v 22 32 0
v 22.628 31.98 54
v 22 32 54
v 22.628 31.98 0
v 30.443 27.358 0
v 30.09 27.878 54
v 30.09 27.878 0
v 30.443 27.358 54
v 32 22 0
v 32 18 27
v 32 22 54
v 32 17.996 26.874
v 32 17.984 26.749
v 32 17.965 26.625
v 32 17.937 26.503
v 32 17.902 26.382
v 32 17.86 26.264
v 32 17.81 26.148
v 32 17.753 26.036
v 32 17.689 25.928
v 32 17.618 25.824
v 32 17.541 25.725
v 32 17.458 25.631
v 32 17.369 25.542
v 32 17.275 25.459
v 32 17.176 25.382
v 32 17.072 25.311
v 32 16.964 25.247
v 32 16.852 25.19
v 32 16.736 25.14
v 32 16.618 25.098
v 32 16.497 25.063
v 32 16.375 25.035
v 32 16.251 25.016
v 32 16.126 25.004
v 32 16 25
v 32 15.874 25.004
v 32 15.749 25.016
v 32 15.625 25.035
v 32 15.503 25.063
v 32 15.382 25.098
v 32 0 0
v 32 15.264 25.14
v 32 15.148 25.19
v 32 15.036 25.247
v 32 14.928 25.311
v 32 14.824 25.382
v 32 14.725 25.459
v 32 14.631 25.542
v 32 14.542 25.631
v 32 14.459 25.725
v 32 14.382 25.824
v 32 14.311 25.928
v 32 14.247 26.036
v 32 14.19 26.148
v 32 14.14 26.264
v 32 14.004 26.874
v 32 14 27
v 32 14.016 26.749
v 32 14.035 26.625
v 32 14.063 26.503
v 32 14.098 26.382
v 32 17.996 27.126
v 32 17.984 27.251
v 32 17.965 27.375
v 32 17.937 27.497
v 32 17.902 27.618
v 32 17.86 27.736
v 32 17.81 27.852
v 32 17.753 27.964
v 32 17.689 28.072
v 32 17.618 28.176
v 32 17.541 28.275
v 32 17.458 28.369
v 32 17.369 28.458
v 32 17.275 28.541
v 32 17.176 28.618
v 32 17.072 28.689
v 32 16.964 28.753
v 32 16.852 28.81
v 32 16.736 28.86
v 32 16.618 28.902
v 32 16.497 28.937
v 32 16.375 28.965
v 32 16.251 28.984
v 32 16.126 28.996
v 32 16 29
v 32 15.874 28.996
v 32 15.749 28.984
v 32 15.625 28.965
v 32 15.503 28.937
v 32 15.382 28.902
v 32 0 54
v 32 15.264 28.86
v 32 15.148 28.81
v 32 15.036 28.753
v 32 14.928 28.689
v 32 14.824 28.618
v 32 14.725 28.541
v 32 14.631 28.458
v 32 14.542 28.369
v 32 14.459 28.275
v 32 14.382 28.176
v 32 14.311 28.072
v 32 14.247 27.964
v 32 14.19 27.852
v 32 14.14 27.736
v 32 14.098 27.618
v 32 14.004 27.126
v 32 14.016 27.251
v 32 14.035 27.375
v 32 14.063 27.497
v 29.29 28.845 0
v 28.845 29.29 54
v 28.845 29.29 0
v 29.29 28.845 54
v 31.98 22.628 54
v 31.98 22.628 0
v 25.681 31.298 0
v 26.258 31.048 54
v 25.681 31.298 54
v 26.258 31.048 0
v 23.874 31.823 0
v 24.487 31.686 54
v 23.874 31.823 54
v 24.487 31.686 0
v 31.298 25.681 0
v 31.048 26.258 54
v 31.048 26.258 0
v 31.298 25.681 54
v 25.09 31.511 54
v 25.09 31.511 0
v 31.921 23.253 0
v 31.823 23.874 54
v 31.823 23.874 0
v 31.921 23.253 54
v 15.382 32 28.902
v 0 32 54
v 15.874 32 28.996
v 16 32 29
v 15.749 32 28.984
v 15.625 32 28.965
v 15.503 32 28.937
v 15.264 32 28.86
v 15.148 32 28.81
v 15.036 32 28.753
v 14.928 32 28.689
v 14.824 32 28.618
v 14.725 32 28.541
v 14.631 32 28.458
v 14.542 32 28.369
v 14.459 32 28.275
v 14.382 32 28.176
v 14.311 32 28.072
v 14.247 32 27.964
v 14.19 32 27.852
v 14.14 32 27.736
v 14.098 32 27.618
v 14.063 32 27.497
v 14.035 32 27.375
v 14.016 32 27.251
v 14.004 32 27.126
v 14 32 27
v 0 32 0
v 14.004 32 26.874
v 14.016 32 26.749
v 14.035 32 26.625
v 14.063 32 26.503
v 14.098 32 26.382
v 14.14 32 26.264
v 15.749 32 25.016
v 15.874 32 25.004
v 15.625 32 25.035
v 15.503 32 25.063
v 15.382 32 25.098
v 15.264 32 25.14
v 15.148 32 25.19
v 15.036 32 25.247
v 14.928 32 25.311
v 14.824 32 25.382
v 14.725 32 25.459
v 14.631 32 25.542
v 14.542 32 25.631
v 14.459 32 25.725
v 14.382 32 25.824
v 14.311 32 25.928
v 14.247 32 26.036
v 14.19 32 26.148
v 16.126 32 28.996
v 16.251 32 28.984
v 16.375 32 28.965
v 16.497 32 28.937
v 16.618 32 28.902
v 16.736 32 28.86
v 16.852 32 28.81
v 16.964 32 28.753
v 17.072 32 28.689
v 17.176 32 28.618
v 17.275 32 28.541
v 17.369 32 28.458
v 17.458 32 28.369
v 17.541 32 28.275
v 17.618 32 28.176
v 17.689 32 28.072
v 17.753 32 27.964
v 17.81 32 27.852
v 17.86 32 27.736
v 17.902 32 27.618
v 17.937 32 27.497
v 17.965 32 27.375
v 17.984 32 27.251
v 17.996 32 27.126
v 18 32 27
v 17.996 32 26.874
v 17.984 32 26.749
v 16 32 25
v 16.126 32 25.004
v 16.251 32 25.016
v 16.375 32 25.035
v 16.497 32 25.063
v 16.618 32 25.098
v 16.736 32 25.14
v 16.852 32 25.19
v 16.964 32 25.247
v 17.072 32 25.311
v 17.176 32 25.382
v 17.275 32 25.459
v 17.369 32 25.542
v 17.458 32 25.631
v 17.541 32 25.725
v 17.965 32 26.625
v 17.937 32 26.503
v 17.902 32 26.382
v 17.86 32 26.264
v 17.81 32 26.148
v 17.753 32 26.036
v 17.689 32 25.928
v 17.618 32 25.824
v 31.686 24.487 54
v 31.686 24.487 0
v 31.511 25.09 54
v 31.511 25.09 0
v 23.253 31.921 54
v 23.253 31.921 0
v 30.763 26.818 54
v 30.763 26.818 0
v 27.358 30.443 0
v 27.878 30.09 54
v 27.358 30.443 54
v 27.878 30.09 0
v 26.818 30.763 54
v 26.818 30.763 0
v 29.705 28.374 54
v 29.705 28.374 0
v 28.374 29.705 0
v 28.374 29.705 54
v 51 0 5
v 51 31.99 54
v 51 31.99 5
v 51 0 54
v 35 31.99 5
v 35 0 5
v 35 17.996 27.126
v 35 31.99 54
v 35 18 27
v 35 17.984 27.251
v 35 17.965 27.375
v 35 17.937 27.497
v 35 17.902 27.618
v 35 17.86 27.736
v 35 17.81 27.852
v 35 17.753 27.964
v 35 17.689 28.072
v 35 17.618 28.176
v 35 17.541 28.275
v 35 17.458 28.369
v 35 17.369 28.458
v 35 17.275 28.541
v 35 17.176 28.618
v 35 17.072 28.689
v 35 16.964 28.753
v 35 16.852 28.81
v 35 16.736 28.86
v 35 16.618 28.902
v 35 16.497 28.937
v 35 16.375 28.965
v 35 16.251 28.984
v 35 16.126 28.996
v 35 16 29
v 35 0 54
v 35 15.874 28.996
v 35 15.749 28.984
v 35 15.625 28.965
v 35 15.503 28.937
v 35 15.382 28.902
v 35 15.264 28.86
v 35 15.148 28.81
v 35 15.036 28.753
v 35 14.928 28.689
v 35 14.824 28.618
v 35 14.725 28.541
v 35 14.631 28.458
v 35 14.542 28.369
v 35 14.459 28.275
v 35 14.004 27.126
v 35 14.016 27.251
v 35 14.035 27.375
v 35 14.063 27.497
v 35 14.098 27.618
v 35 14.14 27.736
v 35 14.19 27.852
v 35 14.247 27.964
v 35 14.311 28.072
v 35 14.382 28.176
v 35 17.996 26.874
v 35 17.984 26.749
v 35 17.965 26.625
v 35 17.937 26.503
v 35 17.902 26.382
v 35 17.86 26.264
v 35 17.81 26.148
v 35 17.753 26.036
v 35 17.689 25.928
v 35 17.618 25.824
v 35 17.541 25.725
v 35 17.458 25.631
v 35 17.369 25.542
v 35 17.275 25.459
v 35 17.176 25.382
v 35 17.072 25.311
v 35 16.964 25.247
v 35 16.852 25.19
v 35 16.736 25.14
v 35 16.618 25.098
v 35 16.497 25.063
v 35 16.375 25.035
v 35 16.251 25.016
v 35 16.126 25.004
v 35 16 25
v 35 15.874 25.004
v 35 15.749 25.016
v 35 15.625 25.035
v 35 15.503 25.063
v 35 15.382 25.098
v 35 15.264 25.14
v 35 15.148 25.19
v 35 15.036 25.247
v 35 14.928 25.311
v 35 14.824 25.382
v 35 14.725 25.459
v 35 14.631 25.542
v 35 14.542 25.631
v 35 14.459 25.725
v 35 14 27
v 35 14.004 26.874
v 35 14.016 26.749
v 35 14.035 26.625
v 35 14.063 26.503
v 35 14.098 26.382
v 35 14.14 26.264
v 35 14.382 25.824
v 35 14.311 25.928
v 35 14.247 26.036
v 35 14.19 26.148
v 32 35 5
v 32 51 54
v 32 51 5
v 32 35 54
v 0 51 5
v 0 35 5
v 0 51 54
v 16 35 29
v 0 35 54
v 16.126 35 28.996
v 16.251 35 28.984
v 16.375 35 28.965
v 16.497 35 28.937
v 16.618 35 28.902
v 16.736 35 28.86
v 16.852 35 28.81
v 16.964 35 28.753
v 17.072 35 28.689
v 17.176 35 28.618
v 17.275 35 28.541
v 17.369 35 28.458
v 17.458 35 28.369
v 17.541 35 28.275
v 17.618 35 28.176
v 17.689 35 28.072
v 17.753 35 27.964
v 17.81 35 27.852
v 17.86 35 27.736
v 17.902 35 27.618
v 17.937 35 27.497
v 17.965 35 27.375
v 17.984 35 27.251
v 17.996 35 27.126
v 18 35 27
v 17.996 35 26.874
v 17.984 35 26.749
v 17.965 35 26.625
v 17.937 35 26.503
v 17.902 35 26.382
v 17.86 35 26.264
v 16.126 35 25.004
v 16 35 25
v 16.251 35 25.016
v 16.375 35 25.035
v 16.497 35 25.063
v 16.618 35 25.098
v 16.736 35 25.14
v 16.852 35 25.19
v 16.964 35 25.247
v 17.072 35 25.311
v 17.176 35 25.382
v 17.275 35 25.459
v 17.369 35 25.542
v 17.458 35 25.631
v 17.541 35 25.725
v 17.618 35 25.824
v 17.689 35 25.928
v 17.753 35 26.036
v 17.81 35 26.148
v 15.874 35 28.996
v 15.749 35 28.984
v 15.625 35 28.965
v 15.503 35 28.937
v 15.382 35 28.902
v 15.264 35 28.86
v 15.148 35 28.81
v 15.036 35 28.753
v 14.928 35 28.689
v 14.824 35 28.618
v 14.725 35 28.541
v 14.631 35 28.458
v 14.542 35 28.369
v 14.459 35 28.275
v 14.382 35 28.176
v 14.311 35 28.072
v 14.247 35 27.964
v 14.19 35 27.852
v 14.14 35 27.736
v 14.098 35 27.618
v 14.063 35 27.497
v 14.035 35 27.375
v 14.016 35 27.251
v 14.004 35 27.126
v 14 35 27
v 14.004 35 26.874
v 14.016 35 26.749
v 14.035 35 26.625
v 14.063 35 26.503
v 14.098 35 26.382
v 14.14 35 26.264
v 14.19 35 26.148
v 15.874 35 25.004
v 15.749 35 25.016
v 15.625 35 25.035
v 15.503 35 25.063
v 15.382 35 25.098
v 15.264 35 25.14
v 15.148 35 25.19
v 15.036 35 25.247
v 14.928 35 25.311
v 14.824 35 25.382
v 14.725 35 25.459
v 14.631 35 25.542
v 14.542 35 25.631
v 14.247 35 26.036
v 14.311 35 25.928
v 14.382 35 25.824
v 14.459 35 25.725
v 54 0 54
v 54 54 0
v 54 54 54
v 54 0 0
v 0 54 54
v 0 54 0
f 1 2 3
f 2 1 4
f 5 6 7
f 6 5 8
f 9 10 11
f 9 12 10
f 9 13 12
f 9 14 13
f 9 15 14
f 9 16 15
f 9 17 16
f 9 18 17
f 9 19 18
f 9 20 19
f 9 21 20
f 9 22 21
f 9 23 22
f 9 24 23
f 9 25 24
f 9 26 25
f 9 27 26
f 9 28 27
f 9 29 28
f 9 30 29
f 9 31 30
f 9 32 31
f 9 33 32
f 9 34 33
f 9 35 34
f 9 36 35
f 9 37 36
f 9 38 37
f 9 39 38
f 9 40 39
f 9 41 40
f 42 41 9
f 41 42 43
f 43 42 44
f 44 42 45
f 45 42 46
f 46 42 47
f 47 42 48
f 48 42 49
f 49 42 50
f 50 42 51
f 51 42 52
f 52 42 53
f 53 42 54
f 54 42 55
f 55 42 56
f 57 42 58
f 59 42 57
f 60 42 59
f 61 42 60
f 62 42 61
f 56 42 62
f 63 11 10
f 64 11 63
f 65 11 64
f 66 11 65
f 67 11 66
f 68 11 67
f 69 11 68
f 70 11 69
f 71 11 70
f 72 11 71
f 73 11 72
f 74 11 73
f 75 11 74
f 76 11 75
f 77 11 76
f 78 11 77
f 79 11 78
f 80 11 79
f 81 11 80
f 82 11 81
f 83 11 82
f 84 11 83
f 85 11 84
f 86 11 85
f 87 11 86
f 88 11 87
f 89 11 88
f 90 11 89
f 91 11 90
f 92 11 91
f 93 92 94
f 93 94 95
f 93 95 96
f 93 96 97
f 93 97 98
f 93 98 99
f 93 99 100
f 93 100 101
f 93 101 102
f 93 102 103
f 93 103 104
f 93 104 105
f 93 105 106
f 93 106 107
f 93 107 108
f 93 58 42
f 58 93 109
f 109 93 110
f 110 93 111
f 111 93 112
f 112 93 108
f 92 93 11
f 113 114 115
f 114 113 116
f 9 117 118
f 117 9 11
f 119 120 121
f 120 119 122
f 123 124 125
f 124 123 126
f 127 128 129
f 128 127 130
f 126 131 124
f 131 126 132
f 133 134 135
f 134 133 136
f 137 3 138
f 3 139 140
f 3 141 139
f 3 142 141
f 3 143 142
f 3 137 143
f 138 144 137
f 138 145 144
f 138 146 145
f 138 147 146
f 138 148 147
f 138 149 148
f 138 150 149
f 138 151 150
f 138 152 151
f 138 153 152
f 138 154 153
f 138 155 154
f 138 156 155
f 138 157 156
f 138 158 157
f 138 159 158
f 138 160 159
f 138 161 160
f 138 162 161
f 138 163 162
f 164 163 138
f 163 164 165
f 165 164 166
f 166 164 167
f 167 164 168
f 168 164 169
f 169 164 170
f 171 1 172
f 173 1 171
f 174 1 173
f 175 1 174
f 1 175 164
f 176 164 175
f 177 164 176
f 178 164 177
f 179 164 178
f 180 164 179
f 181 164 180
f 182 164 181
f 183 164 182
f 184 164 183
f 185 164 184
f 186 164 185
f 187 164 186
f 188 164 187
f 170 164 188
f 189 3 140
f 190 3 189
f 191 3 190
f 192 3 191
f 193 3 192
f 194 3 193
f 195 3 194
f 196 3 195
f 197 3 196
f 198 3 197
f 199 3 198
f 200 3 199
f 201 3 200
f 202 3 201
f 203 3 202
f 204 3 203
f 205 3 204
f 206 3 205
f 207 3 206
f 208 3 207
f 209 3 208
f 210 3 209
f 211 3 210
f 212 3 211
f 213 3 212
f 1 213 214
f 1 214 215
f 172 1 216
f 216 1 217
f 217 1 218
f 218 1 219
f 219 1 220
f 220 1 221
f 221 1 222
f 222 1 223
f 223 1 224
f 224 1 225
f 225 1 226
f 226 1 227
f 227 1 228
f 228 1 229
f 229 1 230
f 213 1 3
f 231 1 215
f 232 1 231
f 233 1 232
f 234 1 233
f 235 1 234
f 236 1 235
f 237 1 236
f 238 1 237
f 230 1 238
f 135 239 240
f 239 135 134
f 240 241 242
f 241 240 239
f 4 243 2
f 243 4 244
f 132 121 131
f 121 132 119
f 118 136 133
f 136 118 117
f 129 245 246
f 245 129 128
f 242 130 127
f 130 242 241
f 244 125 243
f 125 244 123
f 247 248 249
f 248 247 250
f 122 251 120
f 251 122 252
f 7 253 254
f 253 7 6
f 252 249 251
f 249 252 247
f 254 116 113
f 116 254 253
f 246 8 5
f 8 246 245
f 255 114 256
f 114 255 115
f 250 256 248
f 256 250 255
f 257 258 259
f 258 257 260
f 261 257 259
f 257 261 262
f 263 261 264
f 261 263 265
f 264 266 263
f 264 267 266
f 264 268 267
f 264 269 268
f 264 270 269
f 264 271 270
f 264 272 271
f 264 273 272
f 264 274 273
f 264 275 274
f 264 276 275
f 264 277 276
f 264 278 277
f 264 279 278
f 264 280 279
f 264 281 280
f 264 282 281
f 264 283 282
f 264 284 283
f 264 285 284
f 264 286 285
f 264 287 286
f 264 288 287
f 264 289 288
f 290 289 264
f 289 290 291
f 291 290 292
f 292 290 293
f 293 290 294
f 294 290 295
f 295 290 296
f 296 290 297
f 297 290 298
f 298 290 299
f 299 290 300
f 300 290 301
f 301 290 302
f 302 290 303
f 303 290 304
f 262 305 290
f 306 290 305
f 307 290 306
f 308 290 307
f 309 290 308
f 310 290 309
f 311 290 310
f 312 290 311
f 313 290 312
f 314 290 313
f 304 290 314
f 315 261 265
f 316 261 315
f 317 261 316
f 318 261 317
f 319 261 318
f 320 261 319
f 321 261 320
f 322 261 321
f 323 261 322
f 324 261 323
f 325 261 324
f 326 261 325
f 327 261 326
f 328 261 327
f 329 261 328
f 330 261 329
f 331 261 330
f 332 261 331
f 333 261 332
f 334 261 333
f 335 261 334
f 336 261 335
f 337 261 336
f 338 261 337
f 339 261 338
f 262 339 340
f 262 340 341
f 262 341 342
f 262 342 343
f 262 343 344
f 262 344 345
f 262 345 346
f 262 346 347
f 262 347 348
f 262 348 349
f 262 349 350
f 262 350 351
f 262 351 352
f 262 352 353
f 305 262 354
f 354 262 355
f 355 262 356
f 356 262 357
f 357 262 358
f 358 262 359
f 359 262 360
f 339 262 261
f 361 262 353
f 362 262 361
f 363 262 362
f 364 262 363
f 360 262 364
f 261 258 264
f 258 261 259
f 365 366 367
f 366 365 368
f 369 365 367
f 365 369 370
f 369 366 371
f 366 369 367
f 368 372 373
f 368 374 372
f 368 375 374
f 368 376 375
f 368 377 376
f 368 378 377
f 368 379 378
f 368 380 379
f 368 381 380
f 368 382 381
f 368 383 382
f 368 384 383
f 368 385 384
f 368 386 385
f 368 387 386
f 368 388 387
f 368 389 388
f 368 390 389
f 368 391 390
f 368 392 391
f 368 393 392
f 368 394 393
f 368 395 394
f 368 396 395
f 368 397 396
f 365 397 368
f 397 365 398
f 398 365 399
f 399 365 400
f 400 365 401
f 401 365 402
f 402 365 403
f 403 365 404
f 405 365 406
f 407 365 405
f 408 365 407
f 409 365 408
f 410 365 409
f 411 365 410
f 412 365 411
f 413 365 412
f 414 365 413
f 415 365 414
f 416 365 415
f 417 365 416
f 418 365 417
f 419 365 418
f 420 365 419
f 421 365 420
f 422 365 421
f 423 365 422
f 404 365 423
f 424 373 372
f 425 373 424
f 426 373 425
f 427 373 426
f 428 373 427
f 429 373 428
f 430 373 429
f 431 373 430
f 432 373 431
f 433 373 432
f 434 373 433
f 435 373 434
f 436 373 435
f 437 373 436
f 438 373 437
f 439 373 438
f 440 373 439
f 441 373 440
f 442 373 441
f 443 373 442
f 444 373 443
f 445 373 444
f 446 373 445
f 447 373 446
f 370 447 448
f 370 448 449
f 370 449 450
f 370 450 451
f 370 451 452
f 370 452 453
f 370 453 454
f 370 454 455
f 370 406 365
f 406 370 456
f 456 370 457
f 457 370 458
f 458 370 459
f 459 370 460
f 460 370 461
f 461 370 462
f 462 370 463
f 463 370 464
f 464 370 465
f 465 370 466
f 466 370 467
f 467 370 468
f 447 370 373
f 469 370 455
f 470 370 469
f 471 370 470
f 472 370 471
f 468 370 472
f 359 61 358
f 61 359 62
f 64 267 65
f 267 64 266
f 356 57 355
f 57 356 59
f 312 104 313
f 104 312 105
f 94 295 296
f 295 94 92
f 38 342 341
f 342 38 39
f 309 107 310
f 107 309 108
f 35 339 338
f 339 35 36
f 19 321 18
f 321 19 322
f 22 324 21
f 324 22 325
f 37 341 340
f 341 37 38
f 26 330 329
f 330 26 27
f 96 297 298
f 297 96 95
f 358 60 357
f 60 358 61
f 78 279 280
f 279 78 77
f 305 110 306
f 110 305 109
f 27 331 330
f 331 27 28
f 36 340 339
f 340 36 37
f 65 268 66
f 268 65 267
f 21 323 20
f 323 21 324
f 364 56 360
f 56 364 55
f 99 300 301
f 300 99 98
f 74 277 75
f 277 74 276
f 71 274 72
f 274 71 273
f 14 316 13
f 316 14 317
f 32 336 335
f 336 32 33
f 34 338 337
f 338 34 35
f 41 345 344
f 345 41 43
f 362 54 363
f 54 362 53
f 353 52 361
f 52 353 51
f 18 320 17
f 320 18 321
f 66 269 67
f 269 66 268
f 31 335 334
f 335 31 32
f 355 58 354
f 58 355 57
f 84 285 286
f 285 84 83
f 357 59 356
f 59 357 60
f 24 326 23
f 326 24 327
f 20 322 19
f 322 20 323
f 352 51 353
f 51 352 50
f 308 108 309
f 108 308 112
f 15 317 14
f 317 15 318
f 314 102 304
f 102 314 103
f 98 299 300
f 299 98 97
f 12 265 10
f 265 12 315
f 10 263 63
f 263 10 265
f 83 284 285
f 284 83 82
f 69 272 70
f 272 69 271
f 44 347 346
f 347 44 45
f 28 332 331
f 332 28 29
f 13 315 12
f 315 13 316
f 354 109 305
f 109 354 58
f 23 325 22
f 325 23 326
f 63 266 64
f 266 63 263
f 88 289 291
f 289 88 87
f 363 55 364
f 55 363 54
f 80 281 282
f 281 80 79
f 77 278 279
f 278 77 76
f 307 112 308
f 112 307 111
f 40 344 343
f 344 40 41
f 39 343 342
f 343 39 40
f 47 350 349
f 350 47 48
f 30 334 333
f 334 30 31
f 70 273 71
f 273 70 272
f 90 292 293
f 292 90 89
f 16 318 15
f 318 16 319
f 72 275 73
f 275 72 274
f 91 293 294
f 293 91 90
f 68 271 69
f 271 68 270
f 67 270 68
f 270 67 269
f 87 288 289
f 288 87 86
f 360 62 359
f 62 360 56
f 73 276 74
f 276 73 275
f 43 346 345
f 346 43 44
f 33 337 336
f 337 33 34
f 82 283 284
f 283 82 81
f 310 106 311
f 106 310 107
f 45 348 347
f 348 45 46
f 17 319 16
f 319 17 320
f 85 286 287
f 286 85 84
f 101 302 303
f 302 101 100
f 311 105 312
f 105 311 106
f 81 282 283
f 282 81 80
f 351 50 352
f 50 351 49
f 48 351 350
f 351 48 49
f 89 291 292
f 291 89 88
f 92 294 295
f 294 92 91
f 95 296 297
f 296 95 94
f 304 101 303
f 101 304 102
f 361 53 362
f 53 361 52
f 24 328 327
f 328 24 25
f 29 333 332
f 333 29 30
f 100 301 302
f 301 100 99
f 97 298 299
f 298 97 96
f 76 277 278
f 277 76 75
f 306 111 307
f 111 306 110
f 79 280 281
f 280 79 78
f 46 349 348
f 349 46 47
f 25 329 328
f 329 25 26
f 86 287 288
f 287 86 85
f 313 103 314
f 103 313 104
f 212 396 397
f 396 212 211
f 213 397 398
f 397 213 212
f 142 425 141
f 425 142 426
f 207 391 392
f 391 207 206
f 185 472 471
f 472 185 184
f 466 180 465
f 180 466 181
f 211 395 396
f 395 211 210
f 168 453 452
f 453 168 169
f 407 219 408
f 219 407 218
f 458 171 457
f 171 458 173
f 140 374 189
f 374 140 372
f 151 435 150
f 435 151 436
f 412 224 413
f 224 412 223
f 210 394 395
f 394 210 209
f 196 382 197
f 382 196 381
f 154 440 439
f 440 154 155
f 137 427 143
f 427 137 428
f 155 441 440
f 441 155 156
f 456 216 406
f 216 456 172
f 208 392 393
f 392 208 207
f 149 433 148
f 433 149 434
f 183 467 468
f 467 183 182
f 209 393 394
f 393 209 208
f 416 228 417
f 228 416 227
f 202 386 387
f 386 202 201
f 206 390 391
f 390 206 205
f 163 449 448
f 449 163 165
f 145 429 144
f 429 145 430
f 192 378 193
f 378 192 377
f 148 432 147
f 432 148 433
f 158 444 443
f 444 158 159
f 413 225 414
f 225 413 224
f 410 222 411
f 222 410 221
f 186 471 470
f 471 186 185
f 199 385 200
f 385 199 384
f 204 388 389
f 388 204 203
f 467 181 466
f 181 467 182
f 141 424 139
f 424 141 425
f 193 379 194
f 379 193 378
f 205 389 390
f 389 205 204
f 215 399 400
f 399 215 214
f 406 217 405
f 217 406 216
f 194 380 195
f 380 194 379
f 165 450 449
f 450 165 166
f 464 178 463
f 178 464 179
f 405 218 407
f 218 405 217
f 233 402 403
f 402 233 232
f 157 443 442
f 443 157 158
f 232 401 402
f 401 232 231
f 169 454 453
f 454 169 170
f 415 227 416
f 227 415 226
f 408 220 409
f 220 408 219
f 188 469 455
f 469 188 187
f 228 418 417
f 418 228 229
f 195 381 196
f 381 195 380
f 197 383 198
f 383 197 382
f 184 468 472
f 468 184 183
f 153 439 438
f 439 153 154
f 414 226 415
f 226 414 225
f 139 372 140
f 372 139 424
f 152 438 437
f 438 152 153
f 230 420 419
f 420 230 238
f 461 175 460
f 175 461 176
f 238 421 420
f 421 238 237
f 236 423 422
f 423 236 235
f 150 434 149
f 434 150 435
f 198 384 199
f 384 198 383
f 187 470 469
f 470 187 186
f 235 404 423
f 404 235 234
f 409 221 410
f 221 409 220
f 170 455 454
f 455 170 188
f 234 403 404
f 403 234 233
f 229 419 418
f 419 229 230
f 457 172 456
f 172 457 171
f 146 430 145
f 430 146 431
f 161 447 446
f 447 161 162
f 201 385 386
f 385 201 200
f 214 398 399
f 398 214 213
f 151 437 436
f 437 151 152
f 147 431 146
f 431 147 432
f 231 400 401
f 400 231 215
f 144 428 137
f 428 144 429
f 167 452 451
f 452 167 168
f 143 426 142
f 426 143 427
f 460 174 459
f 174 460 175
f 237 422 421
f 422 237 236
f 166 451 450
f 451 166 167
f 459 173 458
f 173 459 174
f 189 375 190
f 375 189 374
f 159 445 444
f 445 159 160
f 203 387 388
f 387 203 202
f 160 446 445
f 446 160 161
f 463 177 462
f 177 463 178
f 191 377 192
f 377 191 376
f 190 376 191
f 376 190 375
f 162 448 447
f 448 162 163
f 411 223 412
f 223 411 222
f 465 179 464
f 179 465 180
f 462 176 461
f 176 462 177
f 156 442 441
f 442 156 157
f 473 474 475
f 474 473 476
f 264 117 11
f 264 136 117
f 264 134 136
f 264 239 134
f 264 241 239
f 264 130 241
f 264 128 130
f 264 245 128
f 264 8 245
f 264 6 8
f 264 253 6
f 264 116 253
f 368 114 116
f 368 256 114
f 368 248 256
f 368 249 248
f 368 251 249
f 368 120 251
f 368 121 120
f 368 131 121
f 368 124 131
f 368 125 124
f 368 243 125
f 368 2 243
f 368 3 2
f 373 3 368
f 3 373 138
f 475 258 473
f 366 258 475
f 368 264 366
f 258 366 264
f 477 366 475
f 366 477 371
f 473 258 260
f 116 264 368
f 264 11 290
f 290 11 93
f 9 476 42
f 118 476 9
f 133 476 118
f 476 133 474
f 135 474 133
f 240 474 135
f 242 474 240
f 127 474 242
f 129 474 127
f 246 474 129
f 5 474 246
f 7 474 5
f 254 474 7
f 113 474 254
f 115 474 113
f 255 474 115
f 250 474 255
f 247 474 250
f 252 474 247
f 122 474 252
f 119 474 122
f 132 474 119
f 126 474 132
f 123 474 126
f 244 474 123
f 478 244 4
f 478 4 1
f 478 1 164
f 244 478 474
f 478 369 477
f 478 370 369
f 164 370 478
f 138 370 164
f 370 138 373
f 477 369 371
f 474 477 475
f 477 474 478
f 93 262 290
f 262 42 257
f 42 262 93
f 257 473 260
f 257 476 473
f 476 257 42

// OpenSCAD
/***********************************************************************************************************************************
'Shelfie' Do it yourself shelf and storage designer by: Mike Thompson 10/4/2015, http://www.thingiverse.com/mike_linus
Based on original concept idea from Milla Niskakoski http://www.thingiverse.com/thing:681835

v2 18/1/2017 - Added 'no internal bracing' option to allow panels to butt together and a corner radius cut-off option for wall mounting
v3 16/4/2017 - Fixed L and T Foot rendering for small cube sizes

Licensing: This work is licensed under a Creative Commons Attribution-NonCommercial-ShareAlike 3.0 Australia License.  Further 
information is available here - http://creativecommons.org/licenses/by-nc-sa/3.0/au/deed.en_GB

I was very impressed with the simplicity and practicality of Milla's initial design, but ran into some major limitations when trying to
construct my own shelves.  The key issues I encountered were:
- No customisable thicknesses. Like may others, I wanted to use the scrap wood I had lying around rather than purchase new material.
- No mixed thicknesses. I wanted to use glass shelves with wood sides, but it wasn't possible unless they were the same thickness.
- No wall mounting bracket option.  Particularly for tall shelves, this is an important safety feature.
- No ability to alter the size of the bracket or the wall thickness to increase strength.
- No ability to attach a shelf midspan.  This is a big issue if you have long sections and want to add a shelf in-between.

Shelfie provides full control over all parameters so you can mix materials of any thickness, add wall mounts, alter the bracket size,
mid mount shelves, change the screw hole size etc. 

Note: incremental 0.01 values added to fix diplay anomalies when using preview (F5)

Instructions: select the bracket type and options to suit your particular materials below. 
************************************************************************************************************************************/

/**************************************************************************
Enter the values corresponding to your bracket requirements in this section
***************************************************************************/

/* [Bracket Options] */

//Bracket Type
bracket_type="L";//[L,T,X,L Foot,T Foot]
//Bracket cube size
bracket_size = 54;//54
//Thickness of Panel 1
panel_thickness = 16;
//Thickness of Panel 2
panel2_thickness = 16;
//Flip bracket for opposite orientation
flip = "false";//[false,true]
//Thickness of panel walls
wall_thickness = 3;
//Thickness of base (set to zero to remove base and allow mid-panel mounting on both panels)
base_thickness=5;
//Hole radius (set to 0 to remove)
hole_radius=2;
//Allow pass through for mid-panel mounting on a single panel
pass_through="false";//[false,true]
//Internal bracing (If removed, all internal bracing will be removed allowing panels to butt together)  
bracing="true";//[true,false]
//Add wall mount plate
wall_mount = "false";//[false,true]
//Corner radius of wall mount. Note: '0' will create a square corner. It is not recommended to set a radius higher than: (bracket_size - (wall_thickness *2) + panel_thickness)
wall_mount_corner_radius = 0;
/* [Hidden] */
$fn=100;

panel_depth=bracket_size-panel_thickness-(wall_thickness*2);
panel_depth2=bracket_size-panel2_thickness-(wall_thickness*2);

module L_piece()
{
    difference()
    {
        cube(bracket_size);
        union()
        {
            hull()//corner cutout
            {
                if(wall_mount=="true")
                {
                    translate([0,0,wall_thickness])
                    {
                        translate([-0.001,-0.001,-0.001])cube([10,10,bracket_size]);
                        translate([bracket_size-panel_thickness-(wall_thickness*2)-10,0,-0.01])cube([10,10,bracket_size]);
                        translate([-0.01,bracket_size-panel2_thickness-(wall_thickness*2)-10,-0.01])cube([10,10,bracket_size]);
                        translate([bracket_size-panel_thickness-(wall_thickness*2)-10,bracket_size-panel2_thickness-(wall_thickness*2)-10,0])cylinder(h=bracket_size,r=10);
                    }
                }
                else
                {
                    translate([-0.001,-0.001,-0.001])cube([10,10,bracket_size+0.01]);
                    translate([bracket_size-panel_thickness-(wall_thickness*2)-10,-0.01,-0.01])cube([10,10,bracket_size+0.02]);
                    translate([-0.01,bracket_size-panel2_thickness-(wall_thickness*2)-10,-0.01])cube([10,10,bracket_size+0.02]);
                    translate([bracket_size-panel_thickness-(wall_thickness*2)-10,bracket_size-panel2_thickness-(wall_thickness*2)-10,0])cylinder(h=bracket_size+0.02,r=10);
                }
            }
            if(wall_mount=="true")
            {
                translate([bracket_size/3,bracket_size/3,0])cylinder(r=hole_radius,h=wall_thickness+0.01); //cut hole in wall mount area
                
                difference() //cut corner radius from base wall mount area
                {
                    cube([wall_mount_corner_radius,wall_mount_corner_radius,wall_thickness]);
                    translate([wall_mount_corner_radius,wall_mount_corner_radius,0])cylinder(r=wall_mount_corner_radius, h= wall_thickness);
                }
            }
            //panel cutout
            if (bracing == "true")
            {
                translate([bracket_size-wall_thickness-panel_thickness,-0.01,base_thickness])cube([panel_thickness,panel_depth2,bracket_size-base_thickness+0.01]);
            }
            else
            {
                translate([bracket_size-wall_thickness-panel_thickness,-0.01,base_thickness])cube([panel_thickness,panel_depth2+wall_thickness+0.01,bracket_size-base_thickness+0.01]);            
            }
            //panel2 cutout
            if (pass_through=="true")
            {
                translate([-0.01,bracket_size-wall_thickness-panel2_thickness,base_thickness])cube([bracket_size+0.02,panel2_thickness,bracket_size-base_thickness+0.01]);
            }
            else
            {
                if (bracing == "true")
                {
                    translate([-0.01,bracket_size-wall_thickness-panel2_thickness,base_thickness])cube([panel_depth+0.01,panel2_thickness,bracket_size-base_thickness+0.01]);
                }
                else
                {
                    translate([-0.01,bracket_size-wall_thickness-panel2_thickness,base_thickness])cube([bracket_size-wall_thickness,panel2_thickness,bracket_size-base_thickness+0.01]);                
                }
            }
            //inside holes
            translate([panel_depth,panel_depth2/2,bracket_size/2])rotate([0,90,0])cylinder(h=wall_thickness+0.01,r=hole_radius);
            translate([panel_depth/2,panel_depth2+wall_thickness,bracket_size/2])rotate([90,0,0])cylinder(h=wall_thickness++0.01,r=hole_radius);
        }
    }
}

module T_piece()
{
    difference()
    {
        union()
        {
            L_piece();
            translate([(bracket_size*2)-(wall_thickness*2)-panel_thickness,0,0])mirror(0,1,0)L_piece();
        }
        union()
        {
            //repunch holes
            translate([panel_depth-0.5,panel_depth2/2,bracket_size/2])rotate([0,90,0])cylinder(h=(wall_thickness*2)+panel_thickness+1,r=hole_radius);
            //repunch internal walls if corner_salid is false
            if (bracing == "false" && pass_through == "false")
            {
                translate([-0.01,bracket_size-wall_thickness-panel2_thickness,base_thickness])cube([bracket_size+0.01,panel2_thickness,bracket_size-base_thickness+0.01]);
            }
        }
    }
}

module X_piece()
{
    difference()
    {
        union()
        {
            T_piece();
            translate([(bracket_size*2)-(wall_thickness*2)-panel_thickness,(bracket_size*2)-(wall_thickness*2)-panel2_thickness,0])rotate([0,0,180])T_piece();
        }
        union()
        {
            //repunch holes
            translate([panel_depth/2,panel_depth+panel_thickness+(wall_thickness*2),bracket_size/2])rotate([90,0,0])cylinder(h=(wall_thickness*2)+panel2_thickness+1,r=hole_radius);
            translate([(panel_depth/2)+bracket_size,panel_depth+panel_thickness+(wall_thickness*2),bracket_size/2])rotate([90,0,0])cylinder(h=(wall_thickness*2)+panel2_thickness+1,r=hole_radius);
            //repunch internal walls if corner_salid is false
            if (bracing == "false" && pass_through == "false")
            {
                translate([bracket_size-wall_thickness-panel_thickness,-0.01,base_thickness])cube([panel_thickness,bracket_size+0.01,bracket_size-base_thickness+0.01]);
            }
        }
    }
}

module L_foot()
{
    L_piece();
    translate([bracket_size,bracket_size+(bracket_size*0.60),0])mirror(0,0,1)rotate([90,0,0])
    hull()
    {
        cube(bracket_size/2);
        translate([0,0,bracket_size*0.60])cube([bracket_size,bracket_size,1]);
    }
}

module T_foot()
{
    T_piece();
    translate([bracket_size-wall_thickness-(panel_thickness/2),bracket_size+(bracket_size*0.60),0])mirror(0,0,1)rotate([90,0,0])
    hull()
    {
       translate([-bracket_size/4,0,0])cube(bracket_size/2);
       translate([-bracket_size/2,0,bracket_size*0.60])cube([bracket_size,bracket_size,1]);
    }
}

if (bracket_type=="L")
{
    if(flip=="true")
    {
        mirror()L_piece();
    }
    else
    {
        L_piece();
    }
}
if (bracket_type=="T")
{
    T_piece();
}
if (bracket_type=="X")
{
    X_piece();
}
if (bracket_type=="L Foot")
{
    if(flip=="true")
    {
        mirror()L_foot();
    }
    else
    {
        L_foot();
    }
}
if (bracket_type=="T Foot")
{
    T_foot();
}
